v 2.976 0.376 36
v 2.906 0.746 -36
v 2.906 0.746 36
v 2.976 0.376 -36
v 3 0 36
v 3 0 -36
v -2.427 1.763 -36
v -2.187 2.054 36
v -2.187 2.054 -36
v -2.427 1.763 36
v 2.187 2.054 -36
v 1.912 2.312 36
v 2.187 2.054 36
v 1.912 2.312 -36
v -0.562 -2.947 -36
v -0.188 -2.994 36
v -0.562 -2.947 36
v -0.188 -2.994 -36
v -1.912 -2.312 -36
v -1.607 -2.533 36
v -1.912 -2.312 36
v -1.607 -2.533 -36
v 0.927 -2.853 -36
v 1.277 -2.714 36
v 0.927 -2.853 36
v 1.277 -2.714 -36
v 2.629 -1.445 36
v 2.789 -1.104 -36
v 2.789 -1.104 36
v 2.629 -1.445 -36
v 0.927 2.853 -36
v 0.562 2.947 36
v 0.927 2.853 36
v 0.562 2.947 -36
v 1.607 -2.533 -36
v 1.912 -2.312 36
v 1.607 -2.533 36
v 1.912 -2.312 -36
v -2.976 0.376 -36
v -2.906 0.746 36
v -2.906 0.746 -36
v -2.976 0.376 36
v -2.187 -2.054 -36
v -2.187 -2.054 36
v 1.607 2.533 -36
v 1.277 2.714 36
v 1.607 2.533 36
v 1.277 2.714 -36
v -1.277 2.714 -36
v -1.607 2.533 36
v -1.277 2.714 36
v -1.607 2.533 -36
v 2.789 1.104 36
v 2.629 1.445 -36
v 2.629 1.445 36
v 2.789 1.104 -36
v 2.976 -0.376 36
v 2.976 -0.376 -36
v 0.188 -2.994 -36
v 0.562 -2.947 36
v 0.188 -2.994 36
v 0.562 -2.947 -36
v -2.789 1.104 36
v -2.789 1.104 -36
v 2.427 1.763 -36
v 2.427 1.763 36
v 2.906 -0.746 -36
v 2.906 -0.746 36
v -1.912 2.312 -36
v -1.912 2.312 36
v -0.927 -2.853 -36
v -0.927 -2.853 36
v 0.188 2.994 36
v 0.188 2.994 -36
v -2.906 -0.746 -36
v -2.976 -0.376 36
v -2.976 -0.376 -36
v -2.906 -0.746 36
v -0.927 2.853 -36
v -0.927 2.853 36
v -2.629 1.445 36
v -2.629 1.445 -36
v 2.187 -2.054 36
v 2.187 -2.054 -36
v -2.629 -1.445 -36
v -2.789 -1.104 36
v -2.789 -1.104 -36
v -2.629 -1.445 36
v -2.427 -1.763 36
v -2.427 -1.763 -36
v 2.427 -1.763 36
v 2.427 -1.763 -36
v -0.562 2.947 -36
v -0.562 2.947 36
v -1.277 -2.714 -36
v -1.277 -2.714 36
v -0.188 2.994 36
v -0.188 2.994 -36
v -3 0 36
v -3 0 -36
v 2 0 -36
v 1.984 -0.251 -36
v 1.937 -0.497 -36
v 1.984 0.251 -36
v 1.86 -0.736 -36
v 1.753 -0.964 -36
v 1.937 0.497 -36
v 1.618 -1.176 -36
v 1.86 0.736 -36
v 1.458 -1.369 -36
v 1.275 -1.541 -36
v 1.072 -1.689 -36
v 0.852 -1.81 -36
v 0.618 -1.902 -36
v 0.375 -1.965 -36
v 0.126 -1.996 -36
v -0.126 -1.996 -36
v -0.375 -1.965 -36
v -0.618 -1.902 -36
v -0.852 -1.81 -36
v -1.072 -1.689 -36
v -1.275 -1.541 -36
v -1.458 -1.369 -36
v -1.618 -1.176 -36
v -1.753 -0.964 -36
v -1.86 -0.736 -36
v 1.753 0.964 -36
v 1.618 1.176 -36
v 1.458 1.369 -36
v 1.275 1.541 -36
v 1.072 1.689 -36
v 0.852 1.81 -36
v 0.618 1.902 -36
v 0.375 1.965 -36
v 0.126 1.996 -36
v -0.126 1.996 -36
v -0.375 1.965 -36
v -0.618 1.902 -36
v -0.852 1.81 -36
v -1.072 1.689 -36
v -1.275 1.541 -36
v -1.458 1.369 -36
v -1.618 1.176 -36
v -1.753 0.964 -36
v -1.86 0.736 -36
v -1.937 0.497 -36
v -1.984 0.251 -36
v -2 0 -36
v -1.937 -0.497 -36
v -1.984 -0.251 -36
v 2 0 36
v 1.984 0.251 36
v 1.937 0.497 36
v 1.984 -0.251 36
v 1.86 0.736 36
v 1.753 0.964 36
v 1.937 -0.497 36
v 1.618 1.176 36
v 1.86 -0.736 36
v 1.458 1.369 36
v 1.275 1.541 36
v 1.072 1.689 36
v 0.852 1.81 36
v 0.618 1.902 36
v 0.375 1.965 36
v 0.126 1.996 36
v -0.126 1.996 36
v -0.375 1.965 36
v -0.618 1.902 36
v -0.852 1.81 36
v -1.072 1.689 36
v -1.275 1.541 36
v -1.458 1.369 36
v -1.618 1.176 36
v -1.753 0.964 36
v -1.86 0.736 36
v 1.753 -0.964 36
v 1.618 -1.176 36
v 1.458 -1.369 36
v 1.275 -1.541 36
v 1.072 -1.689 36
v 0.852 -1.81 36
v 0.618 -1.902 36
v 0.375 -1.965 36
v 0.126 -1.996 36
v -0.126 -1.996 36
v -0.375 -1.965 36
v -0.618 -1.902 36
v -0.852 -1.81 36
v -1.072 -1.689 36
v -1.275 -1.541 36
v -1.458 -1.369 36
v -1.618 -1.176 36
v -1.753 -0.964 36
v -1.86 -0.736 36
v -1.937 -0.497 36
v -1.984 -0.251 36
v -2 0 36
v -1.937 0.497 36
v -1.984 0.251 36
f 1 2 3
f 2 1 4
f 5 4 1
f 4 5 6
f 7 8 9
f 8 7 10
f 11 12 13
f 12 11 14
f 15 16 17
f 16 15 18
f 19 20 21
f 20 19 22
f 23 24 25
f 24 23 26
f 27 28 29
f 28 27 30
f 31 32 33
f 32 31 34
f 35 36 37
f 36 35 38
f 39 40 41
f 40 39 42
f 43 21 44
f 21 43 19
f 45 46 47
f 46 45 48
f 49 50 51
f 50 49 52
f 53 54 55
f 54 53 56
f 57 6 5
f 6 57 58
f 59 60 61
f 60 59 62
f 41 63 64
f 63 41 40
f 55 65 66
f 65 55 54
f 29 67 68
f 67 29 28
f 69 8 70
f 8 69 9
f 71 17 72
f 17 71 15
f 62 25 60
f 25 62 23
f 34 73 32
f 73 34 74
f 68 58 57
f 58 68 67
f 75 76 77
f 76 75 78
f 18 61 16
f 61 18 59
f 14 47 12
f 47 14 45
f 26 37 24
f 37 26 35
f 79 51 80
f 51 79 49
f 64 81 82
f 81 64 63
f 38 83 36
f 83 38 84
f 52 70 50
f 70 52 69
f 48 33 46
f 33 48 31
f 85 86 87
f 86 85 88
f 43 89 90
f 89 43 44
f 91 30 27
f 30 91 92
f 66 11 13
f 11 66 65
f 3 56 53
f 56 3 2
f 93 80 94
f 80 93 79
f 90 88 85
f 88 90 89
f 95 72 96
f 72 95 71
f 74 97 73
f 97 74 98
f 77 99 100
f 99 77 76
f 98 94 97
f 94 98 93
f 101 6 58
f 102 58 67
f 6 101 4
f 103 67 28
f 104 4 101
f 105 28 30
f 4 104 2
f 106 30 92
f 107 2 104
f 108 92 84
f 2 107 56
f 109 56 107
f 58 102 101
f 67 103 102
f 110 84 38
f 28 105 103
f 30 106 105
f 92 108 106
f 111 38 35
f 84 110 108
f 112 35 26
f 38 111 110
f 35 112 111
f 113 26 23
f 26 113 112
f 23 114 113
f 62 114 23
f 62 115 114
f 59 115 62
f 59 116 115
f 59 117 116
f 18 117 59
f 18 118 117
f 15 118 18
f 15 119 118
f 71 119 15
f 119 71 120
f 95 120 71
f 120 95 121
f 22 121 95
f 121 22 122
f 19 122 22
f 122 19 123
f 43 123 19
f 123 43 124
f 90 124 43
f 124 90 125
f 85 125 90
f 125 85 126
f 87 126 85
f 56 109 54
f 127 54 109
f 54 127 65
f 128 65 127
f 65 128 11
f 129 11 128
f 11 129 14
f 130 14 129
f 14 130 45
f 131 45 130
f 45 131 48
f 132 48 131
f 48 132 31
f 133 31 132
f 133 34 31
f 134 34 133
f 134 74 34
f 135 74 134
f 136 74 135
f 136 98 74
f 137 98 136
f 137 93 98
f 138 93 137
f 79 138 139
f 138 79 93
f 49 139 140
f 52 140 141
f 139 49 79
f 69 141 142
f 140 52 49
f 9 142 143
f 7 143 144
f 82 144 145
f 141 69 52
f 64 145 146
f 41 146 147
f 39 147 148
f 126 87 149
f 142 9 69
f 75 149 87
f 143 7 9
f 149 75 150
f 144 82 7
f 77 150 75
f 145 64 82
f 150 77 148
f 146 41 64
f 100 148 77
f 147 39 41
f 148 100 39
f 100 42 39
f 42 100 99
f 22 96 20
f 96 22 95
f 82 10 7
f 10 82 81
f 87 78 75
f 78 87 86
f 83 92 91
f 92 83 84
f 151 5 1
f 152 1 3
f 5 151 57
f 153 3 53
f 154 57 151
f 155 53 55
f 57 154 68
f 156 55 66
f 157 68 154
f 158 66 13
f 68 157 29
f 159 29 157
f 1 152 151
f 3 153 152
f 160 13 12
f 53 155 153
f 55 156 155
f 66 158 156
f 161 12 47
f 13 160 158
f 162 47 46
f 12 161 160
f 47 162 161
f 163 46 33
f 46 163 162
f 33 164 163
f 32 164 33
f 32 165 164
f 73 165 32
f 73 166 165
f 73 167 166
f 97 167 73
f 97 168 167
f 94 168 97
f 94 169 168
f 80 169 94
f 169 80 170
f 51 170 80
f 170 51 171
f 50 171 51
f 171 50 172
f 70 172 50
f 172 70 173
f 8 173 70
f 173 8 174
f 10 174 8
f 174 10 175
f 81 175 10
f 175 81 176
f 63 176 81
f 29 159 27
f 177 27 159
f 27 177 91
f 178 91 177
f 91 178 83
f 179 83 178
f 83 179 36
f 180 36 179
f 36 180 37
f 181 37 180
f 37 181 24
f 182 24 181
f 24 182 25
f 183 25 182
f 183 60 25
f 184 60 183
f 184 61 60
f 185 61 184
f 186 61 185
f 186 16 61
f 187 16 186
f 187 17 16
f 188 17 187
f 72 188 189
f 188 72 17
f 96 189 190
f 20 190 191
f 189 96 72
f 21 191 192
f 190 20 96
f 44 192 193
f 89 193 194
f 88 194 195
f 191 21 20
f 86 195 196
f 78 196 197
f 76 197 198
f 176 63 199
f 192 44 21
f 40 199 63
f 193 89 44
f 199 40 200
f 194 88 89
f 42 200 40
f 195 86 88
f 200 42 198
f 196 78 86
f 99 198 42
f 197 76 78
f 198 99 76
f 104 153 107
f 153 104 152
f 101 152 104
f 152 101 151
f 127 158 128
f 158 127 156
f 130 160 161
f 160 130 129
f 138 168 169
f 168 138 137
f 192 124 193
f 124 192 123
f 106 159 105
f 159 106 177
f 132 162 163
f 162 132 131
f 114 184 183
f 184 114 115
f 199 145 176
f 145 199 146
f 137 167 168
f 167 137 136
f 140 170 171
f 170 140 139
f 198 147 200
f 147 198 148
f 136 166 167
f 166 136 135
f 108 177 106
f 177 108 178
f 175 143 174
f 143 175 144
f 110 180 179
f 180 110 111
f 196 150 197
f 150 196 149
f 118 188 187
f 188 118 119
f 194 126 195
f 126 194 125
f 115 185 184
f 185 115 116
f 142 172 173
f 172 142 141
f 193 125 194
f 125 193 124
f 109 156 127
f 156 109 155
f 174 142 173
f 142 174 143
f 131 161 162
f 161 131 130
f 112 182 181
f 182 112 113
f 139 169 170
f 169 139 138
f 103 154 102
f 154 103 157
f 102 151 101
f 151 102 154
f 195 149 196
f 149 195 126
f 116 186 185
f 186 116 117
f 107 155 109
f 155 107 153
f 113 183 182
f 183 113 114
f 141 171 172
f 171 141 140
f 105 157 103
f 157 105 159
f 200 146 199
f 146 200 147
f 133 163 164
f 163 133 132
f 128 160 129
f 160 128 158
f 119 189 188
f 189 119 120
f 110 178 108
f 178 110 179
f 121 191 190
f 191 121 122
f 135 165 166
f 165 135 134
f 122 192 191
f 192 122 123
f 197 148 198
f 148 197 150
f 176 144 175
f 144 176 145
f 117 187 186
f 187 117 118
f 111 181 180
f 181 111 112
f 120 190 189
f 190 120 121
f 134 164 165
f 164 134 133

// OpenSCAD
$fn = 50;


difference() {
	union() {
		translate(v = [0, 0, -36.0000000000]) {
			cylinder(h = 72, r = 3.0000000000);
		}
	}
	union() {
		translate(v = [0, 0, -100.0000000000]) {
			cylinder(h = 200, r = 2.0000000000);
		}
	}
}
